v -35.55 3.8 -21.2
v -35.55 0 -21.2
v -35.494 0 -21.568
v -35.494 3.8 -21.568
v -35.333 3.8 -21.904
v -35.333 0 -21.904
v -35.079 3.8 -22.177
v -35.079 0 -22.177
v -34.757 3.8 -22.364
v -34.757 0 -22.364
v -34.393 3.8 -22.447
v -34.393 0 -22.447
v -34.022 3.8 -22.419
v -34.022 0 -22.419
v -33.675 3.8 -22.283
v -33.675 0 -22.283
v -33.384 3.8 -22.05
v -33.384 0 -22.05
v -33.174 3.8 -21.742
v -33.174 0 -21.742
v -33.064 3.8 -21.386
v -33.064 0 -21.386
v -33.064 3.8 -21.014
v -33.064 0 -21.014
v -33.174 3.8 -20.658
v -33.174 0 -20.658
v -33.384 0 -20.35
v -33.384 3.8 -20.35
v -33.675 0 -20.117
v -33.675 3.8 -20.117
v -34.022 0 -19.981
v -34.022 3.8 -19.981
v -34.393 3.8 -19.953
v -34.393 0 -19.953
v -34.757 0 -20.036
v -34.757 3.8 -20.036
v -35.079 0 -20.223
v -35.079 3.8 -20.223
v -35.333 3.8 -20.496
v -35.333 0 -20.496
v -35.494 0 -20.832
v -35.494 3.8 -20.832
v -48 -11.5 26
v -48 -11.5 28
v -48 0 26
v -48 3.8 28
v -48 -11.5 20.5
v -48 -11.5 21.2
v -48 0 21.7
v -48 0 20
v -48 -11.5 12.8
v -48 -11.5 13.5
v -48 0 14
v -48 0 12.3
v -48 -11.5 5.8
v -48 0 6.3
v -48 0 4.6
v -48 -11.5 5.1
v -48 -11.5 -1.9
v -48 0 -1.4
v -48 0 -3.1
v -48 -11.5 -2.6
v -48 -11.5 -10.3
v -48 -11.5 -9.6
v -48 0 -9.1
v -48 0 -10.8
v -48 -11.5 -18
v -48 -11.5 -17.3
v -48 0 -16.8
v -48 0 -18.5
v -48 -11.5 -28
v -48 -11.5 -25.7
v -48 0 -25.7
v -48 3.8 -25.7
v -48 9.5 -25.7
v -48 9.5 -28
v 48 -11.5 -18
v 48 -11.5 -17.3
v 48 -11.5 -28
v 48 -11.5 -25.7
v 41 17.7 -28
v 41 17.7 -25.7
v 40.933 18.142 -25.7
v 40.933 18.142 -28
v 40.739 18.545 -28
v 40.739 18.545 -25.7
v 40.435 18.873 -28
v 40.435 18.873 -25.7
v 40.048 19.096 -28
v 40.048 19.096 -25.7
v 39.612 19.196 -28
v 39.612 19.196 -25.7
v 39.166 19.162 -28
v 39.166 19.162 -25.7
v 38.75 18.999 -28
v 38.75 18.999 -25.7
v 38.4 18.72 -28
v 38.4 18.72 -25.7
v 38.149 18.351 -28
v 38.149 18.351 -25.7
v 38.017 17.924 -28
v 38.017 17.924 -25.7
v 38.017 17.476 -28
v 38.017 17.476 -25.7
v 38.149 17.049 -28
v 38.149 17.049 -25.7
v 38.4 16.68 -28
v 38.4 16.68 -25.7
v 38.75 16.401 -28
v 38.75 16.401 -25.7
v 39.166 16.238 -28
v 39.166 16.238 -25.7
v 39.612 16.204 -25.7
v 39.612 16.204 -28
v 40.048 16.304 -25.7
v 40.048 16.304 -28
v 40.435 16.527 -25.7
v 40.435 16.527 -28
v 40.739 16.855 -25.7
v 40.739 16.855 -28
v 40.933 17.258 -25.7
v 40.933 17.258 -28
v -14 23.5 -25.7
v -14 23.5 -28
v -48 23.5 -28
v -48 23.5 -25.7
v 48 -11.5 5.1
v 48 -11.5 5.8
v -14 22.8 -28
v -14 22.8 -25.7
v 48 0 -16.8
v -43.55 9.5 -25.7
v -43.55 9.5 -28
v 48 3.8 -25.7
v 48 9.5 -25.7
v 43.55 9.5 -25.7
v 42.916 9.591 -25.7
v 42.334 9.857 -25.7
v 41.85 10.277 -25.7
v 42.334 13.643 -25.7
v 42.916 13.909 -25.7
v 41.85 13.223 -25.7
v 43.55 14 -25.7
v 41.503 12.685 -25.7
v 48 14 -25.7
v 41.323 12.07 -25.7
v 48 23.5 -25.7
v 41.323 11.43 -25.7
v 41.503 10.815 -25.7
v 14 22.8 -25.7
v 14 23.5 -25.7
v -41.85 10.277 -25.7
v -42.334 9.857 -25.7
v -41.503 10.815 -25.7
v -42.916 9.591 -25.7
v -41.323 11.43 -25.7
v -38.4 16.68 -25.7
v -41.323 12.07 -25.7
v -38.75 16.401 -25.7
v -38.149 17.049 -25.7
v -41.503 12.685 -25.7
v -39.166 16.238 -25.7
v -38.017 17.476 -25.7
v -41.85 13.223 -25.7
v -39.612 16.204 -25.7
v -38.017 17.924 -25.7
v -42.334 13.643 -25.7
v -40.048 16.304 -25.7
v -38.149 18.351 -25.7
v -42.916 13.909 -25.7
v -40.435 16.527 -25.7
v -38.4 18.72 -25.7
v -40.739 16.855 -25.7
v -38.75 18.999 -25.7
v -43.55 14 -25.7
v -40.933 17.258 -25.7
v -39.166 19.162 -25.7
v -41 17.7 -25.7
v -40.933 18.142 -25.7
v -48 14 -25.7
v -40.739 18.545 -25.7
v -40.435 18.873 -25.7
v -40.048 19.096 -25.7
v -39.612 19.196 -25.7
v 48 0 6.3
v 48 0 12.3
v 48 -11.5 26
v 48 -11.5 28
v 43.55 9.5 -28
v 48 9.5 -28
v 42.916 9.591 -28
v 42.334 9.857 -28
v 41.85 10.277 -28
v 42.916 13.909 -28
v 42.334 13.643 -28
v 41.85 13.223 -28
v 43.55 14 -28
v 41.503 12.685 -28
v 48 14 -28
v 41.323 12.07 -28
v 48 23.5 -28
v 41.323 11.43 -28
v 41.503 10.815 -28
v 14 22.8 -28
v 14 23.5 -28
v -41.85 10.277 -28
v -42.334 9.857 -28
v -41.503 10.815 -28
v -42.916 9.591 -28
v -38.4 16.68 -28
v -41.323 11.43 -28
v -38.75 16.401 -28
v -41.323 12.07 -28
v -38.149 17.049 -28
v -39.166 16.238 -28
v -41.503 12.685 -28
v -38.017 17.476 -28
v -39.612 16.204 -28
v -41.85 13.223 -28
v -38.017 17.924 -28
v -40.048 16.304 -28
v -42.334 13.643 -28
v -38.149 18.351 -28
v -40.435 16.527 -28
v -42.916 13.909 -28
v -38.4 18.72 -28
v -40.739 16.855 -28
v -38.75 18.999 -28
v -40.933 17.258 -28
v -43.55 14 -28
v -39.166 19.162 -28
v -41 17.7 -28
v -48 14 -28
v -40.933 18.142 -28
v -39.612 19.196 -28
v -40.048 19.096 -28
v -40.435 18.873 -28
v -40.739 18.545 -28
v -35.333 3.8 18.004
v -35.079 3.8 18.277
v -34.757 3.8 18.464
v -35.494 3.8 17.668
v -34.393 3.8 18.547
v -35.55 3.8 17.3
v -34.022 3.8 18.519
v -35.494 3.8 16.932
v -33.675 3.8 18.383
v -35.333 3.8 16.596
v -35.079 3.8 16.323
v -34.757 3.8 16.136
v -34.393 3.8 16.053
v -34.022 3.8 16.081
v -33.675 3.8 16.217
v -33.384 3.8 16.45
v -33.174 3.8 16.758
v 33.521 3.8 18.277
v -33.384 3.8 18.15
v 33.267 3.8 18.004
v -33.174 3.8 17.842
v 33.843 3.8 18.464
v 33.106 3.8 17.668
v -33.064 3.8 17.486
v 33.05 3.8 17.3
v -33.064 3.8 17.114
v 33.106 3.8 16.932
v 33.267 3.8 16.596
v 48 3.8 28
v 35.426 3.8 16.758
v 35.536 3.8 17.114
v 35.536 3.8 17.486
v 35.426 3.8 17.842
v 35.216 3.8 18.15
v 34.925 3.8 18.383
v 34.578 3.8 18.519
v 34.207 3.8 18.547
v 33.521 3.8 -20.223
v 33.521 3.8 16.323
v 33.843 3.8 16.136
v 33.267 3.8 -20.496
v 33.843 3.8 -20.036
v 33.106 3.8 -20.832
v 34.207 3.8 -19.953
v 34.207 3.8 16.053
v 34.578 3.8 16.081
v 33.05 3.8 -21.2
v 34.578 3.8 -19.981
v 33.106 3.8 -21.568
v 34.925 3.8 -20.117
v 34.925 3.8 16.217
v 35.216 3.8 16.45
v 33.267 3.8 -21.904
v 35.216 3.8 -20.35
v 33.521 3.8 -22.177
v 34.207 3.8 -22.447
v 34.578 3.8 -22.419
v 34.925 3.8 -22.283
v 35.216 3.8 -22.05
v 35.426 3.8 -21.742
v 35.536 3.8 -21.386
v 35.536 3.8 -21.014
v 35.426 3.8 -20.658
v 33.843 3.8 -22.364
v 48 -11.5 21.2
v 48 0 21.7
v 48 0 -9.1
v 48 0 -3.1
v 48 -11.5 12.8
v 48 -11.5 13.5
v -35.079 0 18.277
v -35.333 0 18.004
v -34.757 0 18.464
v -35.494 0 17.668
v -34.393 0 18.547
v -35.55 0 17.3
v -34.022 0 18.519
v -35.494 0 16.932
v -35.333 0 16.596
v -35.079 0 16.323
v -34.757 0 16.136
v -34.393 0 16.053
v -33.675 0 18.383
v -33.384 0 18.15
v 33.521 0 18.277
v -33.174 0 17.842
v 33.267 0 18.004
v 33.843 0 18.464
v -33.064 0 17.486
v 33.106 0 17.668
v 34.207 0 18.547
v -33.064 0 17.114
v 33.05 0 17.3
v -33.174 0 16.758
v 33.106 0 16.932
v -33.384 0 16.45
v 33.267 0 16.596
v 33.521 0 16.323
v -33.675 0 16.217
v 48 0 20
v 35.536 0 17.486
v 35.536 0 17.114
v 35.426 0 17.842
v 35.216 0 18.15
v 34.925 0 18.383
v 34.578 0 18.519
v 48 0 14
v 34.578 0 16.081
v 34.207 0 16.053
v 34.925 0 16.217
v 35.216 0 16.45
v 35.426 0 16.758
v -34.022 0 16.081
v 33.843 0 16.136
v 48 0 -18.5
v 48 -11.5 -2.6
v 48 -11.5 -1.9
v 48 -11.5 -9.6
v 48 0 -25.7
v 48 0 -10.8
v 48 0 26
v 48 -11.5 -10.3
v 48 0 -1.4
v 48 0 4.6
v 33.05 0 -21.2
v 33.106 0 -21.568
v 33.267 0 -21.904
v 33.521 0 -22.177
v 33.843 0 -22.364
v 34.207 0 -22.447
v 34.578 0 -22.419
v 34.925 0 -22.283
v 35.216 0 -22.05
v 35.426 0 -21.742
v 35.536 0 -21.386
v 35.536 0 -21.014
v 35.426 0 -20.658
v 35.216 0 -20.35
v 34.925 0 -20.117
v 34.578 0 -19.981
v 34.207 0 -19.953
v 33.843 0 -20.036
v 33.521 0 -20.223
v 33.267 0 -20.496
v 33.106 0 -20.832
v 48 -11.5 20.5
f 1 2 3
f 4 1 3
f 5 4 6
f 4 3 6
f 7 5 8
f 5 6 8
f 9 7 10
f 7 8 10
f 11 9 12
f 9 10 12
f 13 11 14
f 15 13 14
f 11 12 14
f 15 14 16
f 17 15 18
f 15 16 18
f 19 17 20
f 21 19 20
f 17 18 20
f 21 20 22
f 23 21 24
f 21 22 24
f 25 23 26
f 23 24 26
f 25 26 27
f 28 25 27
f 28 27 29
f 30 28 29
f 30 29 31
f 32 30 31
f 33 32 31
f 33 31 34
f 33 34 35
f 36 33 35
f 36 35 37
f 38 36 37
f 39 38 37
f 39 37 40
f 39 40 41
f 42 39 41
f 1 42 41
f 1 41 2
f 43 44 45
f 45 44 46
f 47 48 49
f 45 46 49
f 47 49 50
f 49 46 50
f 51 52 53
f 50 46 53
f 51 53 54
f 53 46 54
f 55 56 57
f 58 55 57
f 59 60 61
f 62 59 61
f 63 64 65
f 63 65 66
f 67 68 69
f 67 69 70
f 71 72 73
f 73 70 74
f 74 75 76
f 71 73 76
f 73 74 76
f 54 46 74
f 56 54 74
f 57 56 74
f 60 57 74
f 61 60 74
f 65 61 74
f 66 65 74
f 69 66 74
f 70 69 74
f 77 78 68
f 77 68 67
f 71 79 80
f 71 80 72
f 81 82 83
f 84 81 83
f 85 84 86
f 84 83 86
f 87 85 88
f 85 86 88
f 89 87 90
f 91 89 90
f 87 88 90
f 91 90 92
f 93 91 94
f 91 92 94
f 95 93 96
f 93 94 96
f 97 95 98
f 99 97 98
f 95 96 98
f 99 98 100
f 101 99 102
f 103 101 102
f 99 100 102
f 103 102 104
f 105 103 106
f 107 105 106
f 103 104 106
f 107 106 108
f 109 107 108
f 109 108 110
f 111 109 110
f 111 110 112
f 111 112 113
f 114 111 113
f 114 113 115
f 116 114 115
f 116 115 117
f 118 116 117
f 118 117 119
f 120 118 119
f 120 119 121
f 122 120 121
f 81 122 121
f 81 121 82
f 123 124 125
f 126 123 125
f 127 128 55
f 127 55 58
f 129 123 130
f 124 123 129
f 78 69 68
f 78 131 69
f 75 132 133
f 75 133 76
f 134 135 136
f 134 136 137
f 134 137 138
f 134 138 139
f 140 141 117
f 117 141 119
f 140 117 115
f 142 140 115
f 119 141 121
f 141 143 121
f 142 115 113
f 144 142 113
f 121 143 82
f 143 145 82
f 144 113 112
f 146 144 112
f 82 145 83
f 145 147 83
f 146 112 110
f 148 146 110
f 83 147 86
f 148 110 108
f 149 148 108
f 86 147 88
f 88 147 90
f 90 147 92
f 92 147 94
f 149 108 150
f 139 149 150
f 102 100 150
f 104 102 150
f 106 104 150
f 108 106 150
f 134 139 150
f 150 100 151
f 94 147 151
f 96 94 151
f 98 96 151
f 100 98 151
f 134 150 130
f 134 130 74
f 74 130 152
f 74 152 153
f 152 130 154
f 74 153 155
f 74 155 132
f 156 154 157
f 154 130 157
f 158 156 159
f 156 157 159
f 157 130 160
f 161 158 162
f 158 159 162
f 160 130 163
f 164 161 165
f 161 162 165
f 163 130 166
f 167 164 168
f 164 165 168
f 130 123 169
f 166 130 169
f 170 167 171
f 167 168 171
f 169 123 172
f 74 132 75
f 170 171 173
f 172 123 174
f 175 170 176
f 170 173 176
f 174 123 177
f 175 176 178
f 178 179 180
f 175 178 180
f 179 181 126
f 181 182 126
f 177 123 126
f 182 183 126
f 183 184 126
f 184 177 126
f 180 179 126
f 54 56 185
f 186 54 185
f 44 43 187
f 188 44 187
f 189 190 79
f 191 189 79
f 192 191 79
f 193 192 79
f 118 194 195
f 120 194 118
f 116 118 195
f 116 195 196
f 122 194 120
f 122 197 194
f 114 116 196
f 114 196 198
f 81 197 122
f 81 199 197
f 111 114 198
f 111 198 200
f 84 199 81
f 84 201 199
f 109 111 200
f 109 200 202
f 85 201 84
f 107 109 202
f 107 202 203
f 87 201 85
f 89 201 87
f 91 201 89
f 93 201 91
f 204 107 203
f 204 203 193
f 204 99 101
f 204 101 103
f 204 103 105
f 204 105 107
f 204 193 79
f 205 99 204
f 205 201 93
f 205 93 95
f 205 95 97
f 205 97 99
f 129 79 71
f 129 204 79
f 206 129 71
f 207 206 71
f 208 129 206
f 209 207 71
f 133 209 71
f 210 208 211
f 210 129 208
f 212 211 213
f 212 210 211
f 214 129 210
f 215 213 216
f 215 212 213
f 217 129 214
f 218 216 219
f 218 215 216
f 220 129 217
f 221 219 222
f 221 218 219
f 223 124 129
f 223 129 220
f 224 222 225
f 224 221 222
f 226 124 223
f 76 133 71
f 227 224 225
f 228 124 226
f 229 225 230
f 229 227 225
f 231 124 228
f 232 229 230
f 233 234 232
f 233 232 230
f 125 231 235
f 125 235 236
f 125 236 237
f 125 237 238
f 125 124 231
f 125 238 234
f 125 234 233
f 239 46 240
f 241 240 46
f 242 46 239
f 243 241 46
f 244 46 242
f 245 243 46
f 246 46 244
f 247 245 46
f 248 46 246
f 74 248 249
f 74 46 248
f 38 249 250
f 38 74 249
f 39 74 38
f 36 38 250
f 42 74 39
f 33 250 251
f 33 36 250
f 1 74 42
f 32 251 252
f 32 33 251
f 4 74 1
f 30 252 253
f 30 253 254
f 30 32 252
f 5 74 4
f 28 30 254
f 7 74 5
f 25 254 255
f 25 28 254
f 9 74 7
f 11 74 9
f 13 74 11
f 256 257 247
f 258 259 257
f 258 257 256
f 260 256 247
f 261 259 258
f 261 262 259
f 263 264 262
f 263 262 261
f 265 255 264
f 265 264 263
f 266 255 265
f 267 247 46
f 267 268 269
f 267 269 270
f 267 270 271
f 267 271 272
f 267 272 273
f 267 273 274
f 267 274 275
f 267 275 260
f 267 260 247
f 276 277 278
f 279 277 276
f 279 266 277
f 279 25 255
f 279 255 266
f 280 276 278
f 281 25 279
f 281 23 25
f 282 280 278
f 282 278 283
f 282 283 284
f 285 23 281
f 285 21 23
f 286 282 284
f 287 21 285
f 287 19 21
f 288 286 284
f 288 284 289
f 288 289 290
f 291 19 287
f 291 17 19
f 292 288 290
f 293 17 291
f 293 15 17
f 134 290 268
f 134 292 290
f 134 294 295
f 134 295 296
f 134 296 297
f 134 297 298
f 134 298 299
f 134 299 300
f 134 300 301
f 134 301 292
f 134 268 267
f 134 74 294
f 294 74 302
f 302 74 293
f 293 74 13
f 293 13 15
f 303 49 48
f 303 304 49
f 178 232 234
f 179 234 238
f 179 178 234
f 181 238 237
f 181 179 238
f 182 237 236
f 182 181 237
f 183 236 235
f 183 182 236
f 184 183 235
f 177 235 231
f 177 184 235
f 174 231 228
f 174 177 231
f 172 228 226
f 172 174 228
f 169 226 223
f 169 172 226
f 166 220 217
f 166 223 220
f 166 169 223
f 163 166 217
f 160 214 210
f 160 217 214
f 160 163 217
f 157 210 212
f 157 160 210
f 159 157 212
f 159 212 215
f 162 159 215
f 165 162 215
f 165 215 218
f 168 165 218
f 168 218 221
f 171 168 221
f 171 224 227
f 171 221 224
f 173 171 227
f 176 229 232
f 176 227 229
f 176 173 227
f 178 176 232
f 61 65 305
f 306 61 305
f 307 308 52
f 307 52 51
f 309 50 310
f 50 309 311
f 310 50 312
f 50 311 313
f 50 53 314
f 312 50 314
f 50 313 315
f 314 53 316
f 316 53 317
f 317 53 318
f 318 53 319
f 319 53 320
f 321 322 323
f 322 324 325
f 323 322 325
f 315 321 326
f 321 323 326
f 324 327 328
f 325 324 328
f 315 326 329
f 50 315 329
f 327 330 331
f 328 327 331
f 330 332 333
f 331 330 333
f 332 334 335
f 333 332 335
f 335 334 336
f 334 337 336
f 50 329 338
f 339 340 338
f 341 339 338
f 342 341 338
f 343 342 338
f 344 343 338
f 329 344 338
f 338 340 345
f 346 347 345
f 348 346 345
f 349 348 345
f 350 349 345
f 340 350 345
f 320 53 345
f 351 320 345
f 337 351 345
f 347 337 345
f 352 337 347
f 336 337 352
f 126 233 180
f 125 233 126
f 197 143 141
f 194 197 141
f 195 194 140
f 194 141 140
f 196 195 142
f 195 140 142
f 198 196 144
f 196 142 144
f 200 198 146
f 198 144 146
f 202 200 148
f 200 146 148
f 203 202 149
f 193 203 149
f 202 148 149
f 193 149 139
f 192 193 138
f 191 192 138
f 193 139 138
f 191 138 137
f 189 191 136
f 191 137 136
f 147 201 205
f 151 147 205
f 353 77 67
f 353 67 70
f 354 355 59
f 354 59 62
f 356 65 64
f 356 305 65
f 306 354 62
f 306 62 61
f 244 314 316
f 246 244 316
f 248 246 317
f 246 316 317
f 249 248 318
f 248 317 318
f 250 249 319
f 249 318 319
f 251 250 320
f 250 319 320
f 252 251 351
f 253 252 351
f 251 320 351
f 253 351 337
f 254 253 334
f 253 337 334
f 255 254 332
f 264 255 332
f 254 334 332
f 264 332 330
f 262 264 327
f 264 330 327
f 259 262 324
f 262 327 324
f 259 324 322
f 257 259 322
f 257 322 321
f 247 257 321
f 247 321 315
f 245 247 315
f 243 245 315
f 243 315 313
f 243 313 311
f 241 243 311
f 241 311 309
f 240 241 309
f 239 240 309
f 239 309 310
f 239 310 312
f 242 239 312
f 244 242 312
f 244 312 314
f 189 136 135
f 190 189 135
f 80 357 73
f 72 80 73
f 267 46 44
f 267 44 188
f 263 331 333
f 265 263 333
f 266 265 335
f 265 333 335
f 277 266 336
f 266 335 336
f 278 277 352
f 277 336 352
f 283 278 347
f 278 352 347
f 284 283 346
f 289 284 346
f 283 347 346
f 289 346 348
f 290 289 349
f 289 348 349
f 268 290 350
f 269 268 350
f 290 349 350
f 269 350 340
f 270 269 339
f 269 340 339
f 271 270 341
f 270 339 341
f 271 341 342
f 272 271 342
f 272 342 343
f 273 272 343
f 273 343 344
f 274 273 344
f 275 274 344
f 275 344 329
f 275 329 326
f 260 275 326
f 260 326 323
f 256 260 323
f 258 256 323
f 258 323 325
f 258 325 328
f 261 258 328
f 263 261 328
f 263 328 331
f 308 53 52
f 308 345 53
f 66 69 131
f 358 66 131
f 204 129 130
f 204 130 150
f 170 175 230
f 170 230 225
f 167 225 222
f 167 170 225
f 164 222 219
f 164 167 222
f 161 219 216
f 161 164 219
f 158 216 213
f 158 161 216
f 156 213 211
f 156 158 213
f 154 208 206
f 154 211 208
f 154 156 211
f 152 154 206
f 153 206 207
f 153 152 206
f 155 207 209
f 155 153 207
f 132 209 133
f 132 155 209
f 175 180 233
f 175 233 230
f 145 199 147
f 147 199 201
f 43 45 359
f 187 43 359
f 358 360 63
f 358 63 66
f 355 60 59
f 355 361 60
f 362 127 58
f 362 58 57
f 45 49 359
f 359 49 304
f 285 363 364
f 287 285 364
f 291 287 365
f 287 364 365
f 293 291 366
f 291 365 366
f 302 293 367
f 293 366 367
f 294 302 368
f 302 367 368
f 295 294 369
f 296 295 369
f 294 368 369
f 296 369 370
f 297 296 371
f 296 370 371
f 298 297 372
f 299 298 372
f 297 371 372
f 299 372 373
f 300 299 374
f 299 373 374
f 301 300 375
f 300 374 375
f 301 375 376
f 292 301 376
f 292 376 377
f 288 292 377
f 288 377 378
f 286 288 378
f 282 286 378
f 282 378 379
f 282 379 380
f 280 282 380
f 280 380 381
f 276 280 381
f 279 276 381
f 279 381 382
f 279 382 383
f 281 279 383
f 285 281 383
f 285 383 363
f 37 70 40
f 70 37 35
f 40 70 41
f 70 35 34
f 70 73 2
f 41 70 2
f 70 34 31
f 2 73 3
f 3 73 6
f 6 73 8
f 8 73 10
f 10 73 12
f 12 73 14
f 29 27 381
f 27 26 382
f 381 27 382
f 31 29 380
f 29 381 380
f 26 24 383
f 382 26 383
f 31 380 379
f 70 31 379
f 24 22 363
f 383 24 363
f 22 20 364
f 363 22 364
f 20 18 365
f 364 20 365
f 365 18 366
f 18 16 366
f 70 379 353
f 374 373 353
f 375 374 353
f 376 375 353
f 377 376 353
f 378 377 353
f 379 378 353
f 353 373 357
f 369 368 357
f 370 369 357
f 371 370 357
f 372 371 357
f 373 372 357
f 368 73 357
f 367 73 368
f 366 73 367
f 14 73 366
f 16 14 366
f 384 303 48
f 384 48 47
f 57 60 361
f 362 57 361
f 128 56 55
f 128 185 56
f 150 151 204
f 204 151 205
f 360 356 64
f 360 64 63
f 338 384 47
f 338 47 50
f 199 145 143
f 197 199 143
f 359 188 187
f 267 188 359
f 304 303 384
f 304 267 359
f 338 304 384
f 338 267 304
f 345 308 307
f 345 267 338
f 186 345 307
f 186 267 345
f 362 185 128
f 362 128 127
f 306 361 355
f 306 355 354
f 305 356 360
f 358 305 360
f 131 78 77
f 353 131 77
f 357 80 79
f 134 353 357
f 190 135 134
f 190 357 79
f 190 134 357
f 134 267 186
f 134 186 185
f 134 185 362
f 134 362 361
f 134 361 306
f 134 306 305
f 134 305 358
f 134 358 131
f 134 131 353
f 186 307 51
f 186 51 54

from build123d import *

# Parameters (mm, degrees)
SKETCH1_W             = 96
SKETCH1_H             = 56
BOSS_EXTRUDE1_DEPTH   = 3.8
SKETCH2_W             = 96
SKETCH2_H             = 35
BOSS_EXTRUDE2_DEPTH   = 2.3
CUT_EXTRUDE1_DEPTH    = 3.3
SKETCH4_R             = 1.5
CUT_EXTRUDE2_DEPTH    = 3.3
SKETCH5_W             = 96
SKETCH5_H             = 2
BOSS_EXTRUDE3_DEPTH   = 11.5
BOSS_EXTRUDE5_DEPTH   = 48
LPATTERN1_COUNT       = 6
LPATTERN1_PITCH       = 7.7
SKETCH8_W             = 28
SKETCH8_H             = 2.3
CUT_EXTRUDE3_DEPTH    = 0.7
M3X0_5_TAPPED_HOLE1_D = 2.5
LPATTERN2_COUNT       = 2
LPATTERN2_PITCH       = 38.5


with BuildPart() as part:
    # Sketch1 → Boss-Extrude1 (new body)
    with BuildSketch(Plane(origin=(0, 0, 0), x_dir=(1, 0, 0), z_dir=(0, 1, 0))):
        Rectangle(SKETCH1_W, SKETCH1_H)
    extrude(amount=BOSS_EXTRUDE1_DEPTH)

    # Sketch2 → Boss-Extrude2 (add)
    with BuildSketch(Plane(origin=(0, 0, -28), x_dir=(-1, 0, 0), z_dir=(0, 0, -1))):
        with Locations((0, 6)):
            Rectangle(SKETCH2_W, SKETCH2_H)
    extrude(amount=-BOSS_EXTRUDE2_DEPTH)

    # Sketch3 → Cut-Extrude1 (cut, through all)
    with BuildSketch(Plane(origin=(0, 0, -25.7), x_dir=(-1, 0, 0), z_dir=(0, 0, -1))):
        with BuildLine():
            Line((-52.45, 14), (-43.55, 14))
            ThreePointArc((-43.55, 14), (-41.3, 11.75), (-43.55, 9.5))
            Line((-43.55, 9.5), (-52.45, 9.5))
            ThreePointArc((-52.45, 9.5), (-54.7, 11.75), (-52.45, 14))
        make_face()
    cut_extrude1 = extrude(amount=CUT_EXTRUDE1_DEPTH, mode=Mode.SUBTRACT)

    # Sketch4 → Cut-Extrude2 (cut, through all)
    with BuildSketch(Plane.XY.offset(-25.7)):
        with Locations((39.5, 17.7)):
            Circle(SKETCH4_R)
    cut_extrude2 = extrude(amount=-CUT_EXTRUDE2_DEPTH, mode=Mode.SUBTRACT)

    # Mirror1: Cut-Extrude1, Cut-Extrude2 across plane
    add(cut_extrude1.mirror(Plane(origin=(0, 0, 0), x_dir=(0, 0, 1), z_dir=(1, 0, 0))), mode=Mode.SUBTRACT)
    add(cut_extrude2.mirror(Plane(origin=(0, 0, 0), x_dir=(0, 0, 1), z_dir=(1, 0, 0))), mode=Mode.SUBTRACT)

    # Sketch5 → Boss-Extrude3 (add)
    with BuildSketch(Plane(origin=(0, 0, 0), x_dir=(1, 0, 0), z_dir=(0, 1, 0))):
        with Locations((0, -27)):
            Rectangle(SKETCH5_W, SKETCH5_H)
    extrude(amount=-BOSS_EXTRUDE3_DEPTH)

    # Sketch7 → Boss-Extrude5 (add, symmetric)
    with BuildSketch(Plane(origin=(0, 0, 0), x_dir=(0, 0, -1), z_dir=(1, 0, 0))):
        Polygon((-21.7, 0), (-21.2, -11.5), (-20.5, -11.5), (-20, 0), align=None)
    boss_extrude5 = extrude(amount=BOSS_EXTRUDE5_DEPTH, both=True)

    # LPattern1: Boss-Extrude5 ×6
    with Locations(*[(0, 0, -i * LPATTERN1_PITCH) for i in range(1, LPATTERN1_COUNT)]):
        add(boss_extrude5)

    # Sketch8 → Cut-Extrude3 (cut)
    with BuildSketch(Plane(origin=(0, 23.5, 0), x_dir=(1, 0, 0), z_dir=(0, 1, 0))):
        with Locations((0, 26.85)):
            Rectangle(SKETCH8_W, SKETCH8_H)
    extrude(amount=-CUT_EXTRUDE3_DEPTH, mode=Mode.SUBTRACT)

    # M3x0.5 Tapped Hole1 (through all)
    with Locations(Plane(origin=(0, 3.8, 0), x_dir=(1, 0, 0), z_dir=(0, 1, 0))):
        with Locations((-34.3, -17.3), (34.3, -17.3)):
            m3x0_5_tapped_hole1 = Hole(M3X0_5_TAPPED_HOLE1_D / 2)

    # LPattern2: M3x0.5 Tapped Hole1 ×2
    with Locations(*[(0, 0, -i * LPATTERN2_PITCH) for i in range(1, LPATTERN2_COUNT)]):
        add(m3x0_5_tapped_hole1, mode=Mode.SUBTRACT)


solid = part.part
